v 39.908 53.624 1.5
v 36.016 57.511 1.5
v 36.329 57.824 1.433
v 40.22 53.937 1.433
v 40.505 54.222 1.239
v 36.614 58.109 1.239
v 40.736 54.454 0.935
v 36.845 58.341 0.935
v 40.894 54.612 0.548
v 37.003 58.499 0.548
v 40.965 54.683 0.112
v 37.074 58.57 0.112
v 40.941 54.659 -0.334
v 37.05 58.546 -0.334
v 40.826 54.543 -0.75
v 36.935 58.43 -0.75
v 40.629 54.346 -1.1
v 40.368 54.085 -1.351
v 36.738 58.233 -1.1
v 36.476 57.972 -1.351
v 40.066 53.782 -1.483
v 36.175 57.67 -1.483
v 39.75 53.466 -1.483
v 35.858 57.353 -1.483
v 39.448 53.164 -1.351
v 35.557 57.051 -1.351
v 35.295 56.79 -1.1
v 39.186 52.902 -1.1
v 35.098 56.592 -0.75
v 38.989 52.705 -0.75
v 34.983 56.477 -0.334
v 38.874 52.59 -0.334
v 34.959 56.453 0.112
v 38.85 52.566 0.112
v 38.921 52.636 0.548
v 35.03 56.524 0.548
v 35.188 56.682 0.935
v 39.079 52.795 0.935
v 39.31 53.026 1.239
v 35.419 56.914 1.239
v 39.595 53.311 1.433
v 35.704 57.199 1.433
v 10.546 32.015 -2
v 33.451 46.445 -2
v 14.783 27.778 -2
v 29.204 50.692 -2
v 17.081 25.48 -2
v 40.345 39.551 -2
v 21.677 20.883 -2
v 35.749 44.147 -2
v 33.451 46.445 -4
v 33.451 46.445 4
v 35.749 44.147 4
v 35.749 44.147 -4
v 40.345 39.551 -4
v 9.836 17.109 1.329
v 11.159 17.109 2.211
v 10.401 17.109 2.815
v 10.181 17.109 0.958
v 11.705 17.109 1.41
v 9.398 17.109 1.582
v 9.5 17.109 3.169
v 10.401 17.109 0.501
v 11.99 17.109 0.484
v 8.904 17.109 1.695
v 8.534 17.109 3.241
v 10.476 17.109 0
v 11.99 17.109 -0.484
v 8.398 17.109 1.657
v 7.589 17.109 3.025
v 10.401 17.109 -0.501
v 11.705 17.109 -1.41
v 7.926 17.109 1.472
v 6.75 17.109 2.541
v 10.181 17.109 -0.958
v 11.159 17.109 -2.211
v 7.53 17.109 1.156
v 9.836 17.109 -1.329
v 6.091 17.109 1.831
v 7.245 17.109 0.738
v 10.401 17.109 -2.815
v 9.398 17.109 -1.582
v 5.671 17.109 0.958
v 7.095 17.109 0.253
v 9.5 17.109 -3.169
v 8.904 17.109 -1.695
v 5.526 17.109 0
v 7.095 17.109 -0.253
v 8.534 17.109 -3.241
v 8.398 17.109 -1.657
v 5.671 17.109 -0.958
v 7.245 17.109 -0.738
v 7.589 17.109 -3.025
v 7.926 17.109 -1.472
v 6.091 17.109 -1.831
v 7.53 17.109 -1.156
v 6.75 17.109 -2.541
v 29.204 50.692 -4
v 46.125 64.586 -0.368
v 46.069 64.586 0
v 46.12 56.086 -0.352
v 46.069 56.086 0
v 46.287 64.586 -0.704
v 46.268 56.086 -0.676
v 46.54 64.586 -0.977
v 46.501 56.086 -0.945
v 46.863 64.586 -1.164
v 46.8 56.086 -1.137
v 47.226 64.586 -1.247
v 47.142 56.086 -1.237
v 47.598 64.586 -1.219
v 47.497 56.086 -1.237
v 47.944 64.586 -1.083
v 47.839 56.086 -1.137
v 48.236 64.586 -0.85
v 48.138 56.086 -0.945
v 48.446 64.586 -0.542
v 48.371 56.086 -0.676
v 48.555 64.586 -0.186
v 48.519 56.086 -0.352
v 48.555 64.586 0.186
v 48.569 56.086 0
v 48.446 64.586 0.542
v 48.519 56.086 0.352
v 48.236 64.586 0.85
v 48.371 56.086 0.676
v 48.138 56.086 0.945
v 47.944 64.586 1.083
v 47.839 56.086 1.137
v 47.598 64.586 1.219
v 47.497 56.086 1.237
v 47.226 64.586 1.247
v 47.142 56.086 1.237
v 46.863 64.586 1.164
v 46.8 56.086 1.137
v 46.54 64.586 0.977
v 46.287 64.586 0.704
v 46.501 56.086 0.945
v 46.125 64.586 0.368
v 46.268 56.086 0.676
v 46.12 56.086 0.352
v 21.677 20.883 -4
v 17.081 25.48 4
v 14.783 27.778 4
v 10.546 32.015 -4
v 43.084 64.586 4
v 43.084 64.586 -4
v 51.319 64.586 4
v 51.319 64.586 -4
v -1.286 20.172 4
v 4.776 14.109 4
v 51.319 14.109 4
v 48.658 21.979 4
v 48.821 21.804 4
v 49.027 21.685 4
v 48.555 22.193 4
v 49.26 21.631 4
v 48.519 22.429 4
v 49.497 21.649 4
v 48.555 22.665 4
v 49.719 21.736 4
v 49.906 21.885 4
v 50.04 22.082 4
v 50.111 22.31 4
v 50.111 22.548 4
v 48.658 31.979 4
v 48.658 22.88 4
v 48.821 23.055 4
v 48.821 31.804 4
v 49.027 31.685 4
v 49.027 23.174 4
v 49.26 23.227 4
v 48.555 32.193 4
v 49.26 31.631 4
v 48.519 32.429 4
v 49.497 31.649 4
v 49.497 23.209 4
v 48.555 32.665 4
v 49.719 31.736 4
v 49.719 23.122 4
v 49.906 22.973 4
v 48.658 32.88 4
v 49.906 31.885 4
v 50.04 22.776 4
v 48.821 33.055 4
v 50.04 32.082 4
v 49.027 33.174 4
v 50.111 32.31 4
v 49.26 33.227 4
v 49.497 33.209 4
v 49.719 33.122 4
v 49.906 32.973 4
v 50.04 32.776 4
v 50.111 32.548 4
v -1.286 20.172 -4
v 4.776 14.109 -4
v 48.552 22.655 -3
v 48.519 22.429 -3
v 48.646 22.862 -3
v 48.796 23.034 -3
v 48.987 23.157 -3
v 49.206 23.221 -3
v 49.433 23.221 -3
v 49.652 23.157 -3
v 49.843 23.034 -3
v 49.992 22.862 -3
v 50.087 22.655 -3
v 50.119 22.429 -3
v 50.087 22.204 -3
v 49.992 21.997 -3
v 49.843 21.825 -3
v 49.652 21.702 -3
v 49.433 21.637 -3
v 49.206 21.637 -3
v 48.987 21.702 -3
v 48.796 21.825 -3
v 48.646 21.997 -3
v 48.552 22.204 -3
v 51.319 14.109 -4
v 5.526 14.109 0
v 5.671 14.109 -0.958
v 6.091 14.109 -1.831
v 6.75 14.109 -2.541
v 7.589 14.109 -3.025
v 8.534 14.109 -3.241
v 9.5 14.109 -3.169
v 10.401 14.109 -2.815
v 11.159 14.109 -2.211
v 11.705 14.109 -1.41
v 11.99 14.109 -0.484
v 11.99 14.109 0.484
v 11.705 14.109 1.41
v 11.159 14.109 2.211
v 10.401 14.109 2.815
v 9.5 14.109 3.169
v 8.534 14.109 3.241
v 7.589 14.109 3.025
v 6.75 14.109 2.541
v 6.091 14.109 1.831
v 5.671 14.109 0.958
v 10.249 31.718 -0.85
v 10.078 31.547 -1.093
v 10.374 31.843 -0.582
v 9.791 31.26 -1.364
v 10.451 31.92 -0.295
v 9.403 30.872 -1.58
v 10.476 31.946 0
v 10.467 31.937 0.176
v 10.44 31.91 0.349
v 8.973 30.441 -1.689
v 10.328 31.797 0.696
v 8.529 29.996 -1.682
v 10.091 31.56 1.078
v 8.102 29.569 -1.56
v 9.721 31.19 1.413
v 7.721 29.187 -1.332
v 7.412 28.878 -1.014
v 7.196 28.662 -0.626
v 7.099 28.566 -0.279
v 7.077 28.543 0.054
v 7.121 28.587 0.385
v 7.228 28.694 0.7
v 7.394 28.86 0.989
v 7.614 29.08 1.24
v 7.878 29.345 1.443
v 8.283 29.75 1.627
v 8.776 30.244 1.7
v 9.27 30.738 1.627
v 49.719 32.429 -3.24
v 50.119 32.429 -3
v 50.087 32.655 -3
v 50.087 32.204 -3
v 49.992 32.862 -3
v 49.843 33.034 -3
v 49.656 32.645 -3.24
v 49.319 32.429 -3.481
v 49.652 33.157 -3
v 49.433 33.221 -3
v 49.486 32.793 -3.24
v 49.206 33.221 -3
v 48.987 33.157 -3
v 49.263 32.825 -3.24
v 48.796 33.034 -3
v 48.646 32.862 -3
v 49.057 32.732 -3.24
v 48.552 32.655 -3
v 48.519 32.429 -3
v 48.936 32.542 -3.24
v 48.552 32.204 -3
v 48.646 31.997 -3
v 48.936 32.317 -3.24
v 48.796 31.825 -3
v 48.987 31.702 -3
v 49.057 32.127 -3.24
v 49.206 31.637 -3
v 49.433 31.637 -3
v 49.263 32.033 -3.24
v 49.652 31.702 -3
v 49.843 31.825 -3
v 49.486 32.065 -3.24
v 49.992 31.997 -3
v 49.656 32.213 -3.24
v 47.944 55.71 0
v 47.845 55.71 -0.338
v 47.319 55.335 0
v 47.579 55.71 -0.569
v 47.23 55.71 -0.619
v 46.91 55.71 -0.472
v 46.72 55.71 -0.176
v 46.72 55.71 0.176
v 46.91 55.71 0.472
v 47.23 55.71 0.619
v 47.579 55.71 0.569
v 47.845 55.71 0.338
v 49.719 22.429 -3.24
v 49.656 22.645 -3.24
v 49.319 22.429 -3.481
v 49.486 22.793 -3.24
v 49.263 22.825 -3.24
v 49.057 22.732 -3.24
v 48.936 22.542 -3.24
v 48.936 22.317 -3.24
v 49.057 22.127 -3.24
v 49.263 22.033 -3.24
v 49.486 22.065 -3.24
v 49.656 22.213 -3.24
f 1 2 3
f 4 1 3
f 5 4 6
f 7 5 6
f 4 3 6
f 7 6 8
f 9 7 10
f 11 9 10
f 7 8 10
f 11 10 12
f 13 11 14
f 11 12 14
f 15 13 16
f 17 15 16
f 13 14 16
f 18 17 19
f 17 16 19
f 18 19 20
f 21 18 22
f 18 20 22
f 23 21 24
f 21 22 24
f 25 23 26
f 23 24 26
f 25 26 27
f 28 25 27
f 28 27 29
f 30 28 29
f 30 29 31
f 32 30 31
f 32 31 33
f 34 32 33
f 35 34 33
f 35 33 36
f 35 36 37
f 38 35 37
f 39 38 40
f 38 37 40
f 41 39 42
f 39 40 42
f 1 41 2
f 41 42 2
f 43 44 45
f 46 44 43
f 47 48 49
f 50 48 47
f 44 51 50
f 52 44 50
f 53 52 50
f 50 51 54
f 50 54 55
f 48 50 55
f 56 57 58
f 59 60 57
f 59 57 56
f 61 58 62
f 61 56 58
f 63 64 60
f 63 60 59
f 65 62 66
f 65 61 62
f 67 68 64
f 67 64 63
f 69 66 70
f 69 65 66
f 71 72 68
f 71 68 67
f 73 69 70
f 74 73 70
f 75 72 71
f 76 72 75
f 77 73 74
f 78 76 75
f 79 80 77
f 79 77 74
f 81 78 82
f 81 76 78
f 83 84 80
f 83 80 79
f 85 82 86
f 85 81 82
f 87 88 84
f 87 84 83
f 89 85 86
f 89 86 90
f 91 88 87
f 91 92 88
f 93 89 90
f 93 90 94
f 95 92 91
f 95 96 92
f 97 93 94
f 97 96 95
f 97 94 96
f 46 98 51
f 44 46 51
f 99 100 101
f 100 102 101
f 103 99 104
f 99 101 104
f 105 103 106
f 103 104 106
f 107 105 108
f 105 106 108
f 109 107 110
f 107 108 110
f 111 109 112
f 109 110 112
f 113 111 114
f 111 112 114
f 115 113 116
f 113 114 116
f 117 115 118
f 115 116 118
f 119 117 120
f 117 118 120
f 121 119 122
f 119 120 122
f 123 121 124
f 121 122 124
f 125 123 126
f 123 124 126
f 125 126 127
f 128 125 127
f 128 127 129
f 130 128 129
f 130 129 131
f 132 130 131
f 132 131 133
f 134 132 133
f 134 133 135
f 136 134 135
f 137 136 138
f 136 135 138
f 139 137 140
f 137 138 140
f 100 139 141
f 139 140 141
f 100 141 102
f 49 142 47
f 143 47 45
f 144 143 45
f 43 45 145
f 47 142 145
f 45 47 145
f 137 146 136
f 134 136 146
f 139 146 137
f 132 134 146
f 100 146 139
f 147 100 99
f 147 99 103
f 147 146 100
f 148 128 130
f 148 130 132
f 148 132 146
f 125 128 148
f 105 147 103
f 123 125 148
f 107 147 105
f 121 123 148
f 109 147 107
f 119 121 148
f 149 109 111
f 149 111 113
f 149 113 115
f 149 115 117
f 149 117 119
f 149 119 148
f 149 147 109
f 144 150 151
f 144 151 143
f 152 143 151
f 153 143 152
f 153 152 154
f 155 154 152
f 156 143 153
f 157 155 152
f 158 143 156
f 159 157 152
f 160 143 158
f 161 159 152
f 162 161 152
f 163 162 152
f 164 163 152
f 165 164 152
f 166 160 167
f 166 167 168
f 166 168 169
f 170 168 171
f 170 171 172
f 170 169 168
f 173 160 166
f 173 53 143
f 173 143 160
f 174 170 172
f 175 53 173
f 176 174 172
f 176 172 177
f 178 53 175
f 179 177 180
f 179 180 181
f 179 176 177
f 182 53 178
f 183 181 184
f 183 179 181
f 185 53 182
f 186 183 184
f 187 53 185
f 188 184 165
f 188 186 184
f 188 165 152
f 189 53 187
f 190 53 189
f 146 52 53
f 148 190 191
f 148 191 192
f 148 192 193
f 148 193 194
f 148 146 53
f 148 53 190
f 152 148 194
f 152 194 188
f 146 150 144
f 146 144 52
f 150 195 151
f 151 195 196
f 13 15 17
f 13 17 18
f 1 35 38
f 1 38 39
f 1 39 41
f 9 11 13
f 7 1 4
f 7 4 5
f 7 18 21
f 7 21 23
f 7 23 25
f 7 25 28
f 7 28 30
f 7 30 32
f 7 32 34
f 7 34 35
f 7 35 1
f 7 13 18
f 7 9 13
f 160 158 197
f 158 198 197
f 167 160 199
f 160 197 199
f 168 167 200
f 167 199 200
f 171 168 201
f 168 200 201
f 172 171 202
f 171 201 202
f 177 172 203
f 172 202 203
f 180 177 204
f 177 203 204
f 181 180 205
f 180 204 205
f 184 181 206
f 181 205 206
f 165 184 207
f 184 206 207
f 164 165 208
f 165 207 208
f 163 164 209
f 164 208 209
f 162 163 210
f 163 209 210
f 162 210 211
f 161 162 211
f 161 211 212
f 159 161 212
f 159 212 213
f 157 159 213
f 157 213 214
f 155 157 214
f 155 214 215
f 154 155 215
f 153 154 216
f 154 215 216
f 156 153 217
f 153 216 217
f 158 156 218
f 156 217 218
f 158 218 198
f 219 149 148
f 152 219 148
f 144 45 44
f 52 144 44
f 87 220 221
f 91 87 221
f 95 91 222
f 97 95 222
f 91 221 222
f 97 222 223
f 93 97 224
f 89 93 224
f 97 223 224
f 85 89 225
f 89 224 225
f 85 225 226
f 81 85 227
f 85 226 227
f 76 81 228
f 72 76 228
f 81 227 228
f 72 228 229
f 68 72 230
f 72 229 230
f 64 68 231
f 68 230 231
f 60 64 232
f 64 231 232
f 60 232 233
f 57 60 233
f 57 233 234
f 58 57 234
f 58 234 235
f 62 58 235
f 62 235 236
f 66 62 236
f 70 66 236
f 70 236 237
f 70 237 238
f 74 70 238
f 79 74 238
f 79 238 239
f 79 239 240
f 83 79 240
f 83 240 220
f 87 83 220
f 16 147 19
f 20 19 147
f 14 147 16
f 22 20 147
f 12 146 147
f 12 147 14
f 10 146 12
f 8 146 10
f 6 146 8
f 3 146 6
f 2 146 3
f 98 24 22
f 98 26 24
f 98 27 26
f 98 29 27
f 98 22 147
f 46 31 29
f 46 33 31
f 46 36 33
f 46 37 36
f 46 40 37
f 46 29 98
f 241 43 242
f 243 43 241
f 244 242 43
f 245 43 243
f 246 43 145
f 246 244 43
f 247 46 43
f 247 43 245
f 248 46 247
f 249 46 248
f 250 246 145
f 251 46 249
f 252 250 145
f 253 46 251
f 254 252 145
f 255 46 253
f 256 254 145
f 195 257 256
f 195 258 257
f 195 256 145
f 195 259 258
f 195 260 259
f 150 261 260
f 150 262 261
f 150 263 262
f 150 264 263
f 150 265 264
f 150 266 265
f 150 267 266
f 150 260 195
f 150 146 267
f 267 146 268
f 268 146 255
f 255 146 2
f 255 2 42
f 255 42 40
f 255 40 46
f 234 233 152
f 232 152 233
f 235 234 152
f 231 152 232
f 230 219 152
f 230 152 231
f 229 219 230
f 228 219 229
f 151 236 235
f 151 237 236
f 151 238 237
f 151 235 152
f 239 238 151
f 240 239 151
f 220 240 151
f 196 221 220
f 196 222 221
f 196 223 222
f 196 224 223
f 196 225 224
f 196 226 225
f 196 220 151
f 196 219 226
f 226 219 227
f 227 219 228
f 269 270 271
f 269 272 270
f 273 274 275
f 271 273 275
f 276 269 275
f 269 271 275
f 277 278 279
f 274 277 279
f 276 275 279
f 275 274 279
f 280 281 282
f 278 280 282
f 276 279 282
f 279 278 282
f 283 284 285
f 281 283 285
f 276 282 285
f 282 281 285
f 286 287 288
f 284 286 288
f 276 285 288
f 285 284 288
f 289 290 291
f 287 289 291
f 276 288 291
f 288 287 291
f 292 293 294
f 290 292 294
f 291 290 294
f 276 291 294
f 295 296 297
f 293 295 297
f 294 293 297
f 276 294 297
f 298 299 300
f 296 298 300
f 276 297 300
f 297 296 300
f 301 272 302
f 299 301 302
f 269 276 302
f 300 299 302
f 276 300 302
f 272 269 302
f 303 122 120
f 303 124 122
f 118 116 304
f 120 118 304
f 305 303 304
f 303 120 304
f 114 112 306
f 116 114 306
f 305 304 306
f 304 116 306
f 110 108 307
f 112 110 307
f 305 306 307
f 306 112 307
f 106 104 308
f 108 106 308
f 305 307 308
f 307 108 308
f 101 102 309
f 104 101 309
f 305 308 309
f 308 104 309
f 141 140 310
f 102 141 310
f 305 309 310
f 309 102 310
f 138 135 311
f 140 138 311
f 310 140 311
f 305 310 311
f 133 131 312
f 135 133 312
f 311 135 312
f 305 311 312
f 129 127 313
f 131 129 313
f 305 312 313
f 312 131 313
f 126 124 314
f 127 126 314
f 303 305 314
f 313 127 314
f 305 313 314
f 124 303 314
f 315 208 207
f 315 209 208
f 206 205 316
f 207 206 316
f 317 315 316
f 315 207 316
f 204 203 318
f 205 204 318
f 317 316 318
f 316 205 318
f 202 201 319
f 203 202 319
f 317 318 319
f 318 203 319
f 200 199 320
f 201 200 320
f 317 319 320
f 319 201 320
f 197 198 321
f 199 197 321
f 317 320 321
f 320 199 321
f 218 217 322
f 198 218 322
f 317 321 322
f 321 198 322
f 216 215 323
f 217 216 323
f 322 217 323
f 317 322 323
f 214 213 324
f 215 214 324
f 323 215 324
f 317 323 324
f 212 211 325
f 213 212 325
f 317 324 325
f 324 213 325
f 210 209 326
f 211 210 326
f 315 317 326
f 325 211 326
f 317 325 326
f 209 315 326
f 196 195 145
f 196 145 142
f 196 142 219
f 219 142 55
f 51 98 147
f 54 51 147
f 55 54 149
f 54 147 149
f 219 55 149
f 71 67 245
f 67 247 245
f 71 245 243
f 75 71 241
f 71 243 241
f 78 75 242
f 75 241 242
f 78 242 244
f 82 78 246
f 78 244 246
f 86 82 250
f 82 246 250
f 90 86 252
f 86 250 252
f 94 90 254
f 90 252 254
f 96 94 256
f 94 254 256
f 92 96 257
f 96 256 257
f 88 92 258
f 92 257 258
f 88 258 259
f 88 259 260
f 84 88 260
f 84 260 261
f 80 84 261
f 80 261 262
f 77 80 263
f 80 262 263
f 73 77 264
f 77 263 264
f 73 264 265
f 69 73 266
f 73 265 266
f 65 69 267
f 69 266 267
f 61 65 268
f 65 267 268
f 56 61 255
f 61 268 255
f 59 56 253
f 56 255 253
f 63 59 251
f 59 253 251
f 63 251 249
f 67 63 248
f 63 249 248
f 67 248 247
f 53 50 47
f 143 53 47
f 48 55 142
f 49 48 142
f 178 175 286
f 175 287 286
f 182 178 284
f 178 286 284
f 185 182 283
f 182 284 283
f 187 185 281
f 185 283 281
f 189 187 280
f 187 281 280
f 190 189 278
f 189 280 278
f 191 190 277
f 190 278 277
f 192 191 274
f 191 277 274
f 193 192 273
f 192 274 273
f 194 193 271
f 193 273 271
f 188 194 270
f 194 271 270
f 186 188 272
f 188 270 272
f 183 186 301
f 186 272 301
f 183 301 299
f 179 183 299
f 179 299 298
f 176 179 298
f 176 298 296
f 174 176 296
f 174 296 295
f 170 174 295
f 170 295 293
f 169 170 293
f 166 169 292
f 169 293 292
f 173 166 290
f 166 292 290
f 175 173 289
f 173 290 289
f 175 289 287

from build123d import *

# Parameters (mm, degrees)
BOSS_EXTRUDE1_DEPTH            = 4
SKETCH3_W                      = 59.68
SKETCH3_H                      = 8
BOSS_EXTRUDE2_DEPTH            = 5.46
CUT_EXTRUDE1_DEPTH             = 9
SKETCH5_W                      = 59.68
SKETCH5_H                      = 2.16
CUT_EXTRUDE2_DEPTH             = 10
CUT_EXTRUDE7_DEPTH             = 10
M2X0_4_TAPPED_HOLE1_D          = 1.6
M2X0_4_TAPPED_HOLE1_DEPTH      = 7
M2X0_4_TAPPED_HOLE1_TIP        = 0.480688495
CBORE_FOR_M3_SHCS2_D           = 3.4
CBORE_FOR_M3_SHCS2_CBORE_D     = 6.5
CBORE_FOR_M3_SHCS2_CBORE_DEPTH = 3
CUT_EXTRUDE10_DEPTH            = 9
SKETCH24_R                     = 1.5
CUT_EXTRUDE12_DEPTH            = 5.5
M3X0_5_TAPPED_HOLE3_D          = 2.5
M3X0_5_TAPPED_HOLE3_DEPTH      = 8.5
M3X0_5_TAPPED_HOLE3_TIP        = 0.751075774
CUT_EXTRUDE13_DEPTH            = 2


with BuildPart() as part:
    # Sketch2 → Boss-Extrude1 (new body, symmetric)
    with BuildSketch(Plane.XY):
        Polygon((-8.360559535, 17.409242356), (51.319440465, 17.409242356), (51.319440465, 71.653558741), (36.009440465, 71.653558741), (43.084036895, 64.586021309), (-1.285963105, 20.171704924), (-8.360559535, 27.239242356), align=None)
    extrude(amount=BOSS_EXTRUDE1_DEPTH, both=True)

    # Sketch3 → Boss-Extrude2 (add)
    with BuildSketch(Plane.XZ.offset(-17.409242356)):
        with Locations((21.479440465, 0)):
            Rectangle(SKETCH3_W, SKETCH3_H)
    extrude(amount=BOSS_EXTRUDE2_DEPTH)

    # Sketch4 → Cut-Extrude1 (cut, through all)
    with BuildSketch(Plane(origin=(0, 0, -4), x_dir=(-1, 0, 0), z_dir=(0, 0, -1))):
        Polygon((-33.450754625, 46.445299472), (-35.748851663, 44.147202433), (-17.08123264, 25.47958341), (-14.783135601, 27.777680449), align=None)
    extrude(amount=-CUT_EXTRUDE1_DEPTH, mode=Mode.SUBTRACT)

    # Sketch5 → Cut-Extrude2 (cut)
    with BuildSketch(Plane(origin=(0, 0, -4), x_dir=(-1, 0, 0), z_dir=(0, 0, -1))):
        with Locations((-21.479440465, 13.029242356)):
            Rectangle(SKETCH5_W, SKETCH5_H)
    extrude(amount=-CUT_EXTRUDE2_DEPTH, mode=Mode.SUBTRACT)

    # Sketch7 → Cut-Extrude7 (cut)
    with BuildSketch(Plane(origin=(0, 0, -4), x_dir=(-1, 0, 0), z_dir=(0, 0, -1))):
        Polygon((1.285963105, 20.171704924), (-5.082290623, 13.803451195), (8.360559535, 13.803451195), (8.360559535, 14.109242356), (8.360559535, 29.043387574), (1.285963105, 29.043387574), align=None)
    extrude(amount=-CUT_EXTRUDE7_DEPTH, mode=Mode.SUBTRACT)

    # M2x0.4 Tapped Hole1
    with Locations(Plane.XY.offset(4)):
        with Locations((49.319440465, 32.429242356), (49.319440465, 22.429242356)):
            Hole(M2X0_4_TAPPED_HOLE1_D / 2, depth=M2X0_4_TAPPED_HOLE1_DEPTH)
            with Locations((0, 0, -(M2X0_4_TAPPED_HOLE1_DEPTH + M2X0_4_TAPPED_HOLE1_TIP / 2))):  # 118° drill point
                Cone(0, M2X0_4_TAPPED_HOLE1_D / 2, M2X0_4_TAPPED_HOLE1_TIP, mode=Mode.SUBTRACT)

    # CBORE for M3 SHCS2 (through all)
    with Locations(Plane(origin=(0, 14.109242356, 0), x_dir=(-1, 0, 0), z_dir=(0, -1, 0))):
        with Locations((-8.776499462, 0)):
            CounterBoreHole(CBORE_FOR_M3_SHCS2_D / 2, CBORE_FOR_M3_SHCS2_CBORE_D / 2, CBORE_FOR_M3_SHCS2_CBORE_DEPTH)

    # Sketch22 → Cut-Extrude10 (cut, through all)
    with BuildSketch(Plane(origin=(0, 0, -4), x_dir=(-1, 0, 0), z_dir=(0, 0, -1))):
        Polygon((-43.084036895, 64.586021309), (-51.319440465, 64.586021309), (-51.319440465, 71.653558741), (-36.009440465, 71.653558741), align=None)
    extrude(amount=-CUT_EXTRUDE10_DEPTH, mode=Mode.SUBTRACT)

    # Sketch24 → Cut-Extrude12 (cut)
    with BuildSketch(Plane(origin=(-10.729470873, 10.71876506, 0), x_dir=(0, 0, 1), z_dir=(-0.707459643, 0.706753743, 0))):
        with Locations((0, 66.141807925)):
            Circle(SKETCH24_R)
    extrude(amount=-CUT_EXTRUDE12_DEPTH, mode=Mode.SUBTRACT)

    # M3x0.5 Tapped Hole3
    with Locations(Plane(origin=(0, 64.586021309, 0), x_dir=(1, 0, 0), z_dir=(0, 1, 0))):
        with Locations((47.319440465, 0)):
            Hole(M3X0_5_TAPPED_HOLE3_D / 2, depth=M3X0_5_TAPPED_HOLE3_DEPTH)
            with Locations((0, 0, -(M3X0_5_TAPPED_HOLE3_DEPTH + M3X0_5_TAPPED_HOLE3_TIP / 2))):  # 118° drill point
                Cone(0, M3X0_5_TAPPED_HOLE3_D / 2, M3X0_5_TAPPED_HOLE3_TIP, mode=Mode.SUBTRACT)

    # Sketch28 → Cut-Extrude13 (cut)
    with BuildSketch(Plane(origin=(0, 0, -4), x_dir=(-1, 0, 0), z_dir=(0, 0, -1))):
        Polygon((-33.450754625, 46.445299472), (-35.748851663, 44.147202433), (-40.345045741, 39.551008355), (-21.677426718, 20.883389332), (-17.08123264, 25.47958341), (-14.783135601, 27.777680449), (-10.545665345, 32.015150705), (-29.20396649, 50.692087606), align=None)
    extrude(amount=-CUT_EXTRUDE13_DEPTH, mode=Mode.SUBTRACT)


solid = part.part
